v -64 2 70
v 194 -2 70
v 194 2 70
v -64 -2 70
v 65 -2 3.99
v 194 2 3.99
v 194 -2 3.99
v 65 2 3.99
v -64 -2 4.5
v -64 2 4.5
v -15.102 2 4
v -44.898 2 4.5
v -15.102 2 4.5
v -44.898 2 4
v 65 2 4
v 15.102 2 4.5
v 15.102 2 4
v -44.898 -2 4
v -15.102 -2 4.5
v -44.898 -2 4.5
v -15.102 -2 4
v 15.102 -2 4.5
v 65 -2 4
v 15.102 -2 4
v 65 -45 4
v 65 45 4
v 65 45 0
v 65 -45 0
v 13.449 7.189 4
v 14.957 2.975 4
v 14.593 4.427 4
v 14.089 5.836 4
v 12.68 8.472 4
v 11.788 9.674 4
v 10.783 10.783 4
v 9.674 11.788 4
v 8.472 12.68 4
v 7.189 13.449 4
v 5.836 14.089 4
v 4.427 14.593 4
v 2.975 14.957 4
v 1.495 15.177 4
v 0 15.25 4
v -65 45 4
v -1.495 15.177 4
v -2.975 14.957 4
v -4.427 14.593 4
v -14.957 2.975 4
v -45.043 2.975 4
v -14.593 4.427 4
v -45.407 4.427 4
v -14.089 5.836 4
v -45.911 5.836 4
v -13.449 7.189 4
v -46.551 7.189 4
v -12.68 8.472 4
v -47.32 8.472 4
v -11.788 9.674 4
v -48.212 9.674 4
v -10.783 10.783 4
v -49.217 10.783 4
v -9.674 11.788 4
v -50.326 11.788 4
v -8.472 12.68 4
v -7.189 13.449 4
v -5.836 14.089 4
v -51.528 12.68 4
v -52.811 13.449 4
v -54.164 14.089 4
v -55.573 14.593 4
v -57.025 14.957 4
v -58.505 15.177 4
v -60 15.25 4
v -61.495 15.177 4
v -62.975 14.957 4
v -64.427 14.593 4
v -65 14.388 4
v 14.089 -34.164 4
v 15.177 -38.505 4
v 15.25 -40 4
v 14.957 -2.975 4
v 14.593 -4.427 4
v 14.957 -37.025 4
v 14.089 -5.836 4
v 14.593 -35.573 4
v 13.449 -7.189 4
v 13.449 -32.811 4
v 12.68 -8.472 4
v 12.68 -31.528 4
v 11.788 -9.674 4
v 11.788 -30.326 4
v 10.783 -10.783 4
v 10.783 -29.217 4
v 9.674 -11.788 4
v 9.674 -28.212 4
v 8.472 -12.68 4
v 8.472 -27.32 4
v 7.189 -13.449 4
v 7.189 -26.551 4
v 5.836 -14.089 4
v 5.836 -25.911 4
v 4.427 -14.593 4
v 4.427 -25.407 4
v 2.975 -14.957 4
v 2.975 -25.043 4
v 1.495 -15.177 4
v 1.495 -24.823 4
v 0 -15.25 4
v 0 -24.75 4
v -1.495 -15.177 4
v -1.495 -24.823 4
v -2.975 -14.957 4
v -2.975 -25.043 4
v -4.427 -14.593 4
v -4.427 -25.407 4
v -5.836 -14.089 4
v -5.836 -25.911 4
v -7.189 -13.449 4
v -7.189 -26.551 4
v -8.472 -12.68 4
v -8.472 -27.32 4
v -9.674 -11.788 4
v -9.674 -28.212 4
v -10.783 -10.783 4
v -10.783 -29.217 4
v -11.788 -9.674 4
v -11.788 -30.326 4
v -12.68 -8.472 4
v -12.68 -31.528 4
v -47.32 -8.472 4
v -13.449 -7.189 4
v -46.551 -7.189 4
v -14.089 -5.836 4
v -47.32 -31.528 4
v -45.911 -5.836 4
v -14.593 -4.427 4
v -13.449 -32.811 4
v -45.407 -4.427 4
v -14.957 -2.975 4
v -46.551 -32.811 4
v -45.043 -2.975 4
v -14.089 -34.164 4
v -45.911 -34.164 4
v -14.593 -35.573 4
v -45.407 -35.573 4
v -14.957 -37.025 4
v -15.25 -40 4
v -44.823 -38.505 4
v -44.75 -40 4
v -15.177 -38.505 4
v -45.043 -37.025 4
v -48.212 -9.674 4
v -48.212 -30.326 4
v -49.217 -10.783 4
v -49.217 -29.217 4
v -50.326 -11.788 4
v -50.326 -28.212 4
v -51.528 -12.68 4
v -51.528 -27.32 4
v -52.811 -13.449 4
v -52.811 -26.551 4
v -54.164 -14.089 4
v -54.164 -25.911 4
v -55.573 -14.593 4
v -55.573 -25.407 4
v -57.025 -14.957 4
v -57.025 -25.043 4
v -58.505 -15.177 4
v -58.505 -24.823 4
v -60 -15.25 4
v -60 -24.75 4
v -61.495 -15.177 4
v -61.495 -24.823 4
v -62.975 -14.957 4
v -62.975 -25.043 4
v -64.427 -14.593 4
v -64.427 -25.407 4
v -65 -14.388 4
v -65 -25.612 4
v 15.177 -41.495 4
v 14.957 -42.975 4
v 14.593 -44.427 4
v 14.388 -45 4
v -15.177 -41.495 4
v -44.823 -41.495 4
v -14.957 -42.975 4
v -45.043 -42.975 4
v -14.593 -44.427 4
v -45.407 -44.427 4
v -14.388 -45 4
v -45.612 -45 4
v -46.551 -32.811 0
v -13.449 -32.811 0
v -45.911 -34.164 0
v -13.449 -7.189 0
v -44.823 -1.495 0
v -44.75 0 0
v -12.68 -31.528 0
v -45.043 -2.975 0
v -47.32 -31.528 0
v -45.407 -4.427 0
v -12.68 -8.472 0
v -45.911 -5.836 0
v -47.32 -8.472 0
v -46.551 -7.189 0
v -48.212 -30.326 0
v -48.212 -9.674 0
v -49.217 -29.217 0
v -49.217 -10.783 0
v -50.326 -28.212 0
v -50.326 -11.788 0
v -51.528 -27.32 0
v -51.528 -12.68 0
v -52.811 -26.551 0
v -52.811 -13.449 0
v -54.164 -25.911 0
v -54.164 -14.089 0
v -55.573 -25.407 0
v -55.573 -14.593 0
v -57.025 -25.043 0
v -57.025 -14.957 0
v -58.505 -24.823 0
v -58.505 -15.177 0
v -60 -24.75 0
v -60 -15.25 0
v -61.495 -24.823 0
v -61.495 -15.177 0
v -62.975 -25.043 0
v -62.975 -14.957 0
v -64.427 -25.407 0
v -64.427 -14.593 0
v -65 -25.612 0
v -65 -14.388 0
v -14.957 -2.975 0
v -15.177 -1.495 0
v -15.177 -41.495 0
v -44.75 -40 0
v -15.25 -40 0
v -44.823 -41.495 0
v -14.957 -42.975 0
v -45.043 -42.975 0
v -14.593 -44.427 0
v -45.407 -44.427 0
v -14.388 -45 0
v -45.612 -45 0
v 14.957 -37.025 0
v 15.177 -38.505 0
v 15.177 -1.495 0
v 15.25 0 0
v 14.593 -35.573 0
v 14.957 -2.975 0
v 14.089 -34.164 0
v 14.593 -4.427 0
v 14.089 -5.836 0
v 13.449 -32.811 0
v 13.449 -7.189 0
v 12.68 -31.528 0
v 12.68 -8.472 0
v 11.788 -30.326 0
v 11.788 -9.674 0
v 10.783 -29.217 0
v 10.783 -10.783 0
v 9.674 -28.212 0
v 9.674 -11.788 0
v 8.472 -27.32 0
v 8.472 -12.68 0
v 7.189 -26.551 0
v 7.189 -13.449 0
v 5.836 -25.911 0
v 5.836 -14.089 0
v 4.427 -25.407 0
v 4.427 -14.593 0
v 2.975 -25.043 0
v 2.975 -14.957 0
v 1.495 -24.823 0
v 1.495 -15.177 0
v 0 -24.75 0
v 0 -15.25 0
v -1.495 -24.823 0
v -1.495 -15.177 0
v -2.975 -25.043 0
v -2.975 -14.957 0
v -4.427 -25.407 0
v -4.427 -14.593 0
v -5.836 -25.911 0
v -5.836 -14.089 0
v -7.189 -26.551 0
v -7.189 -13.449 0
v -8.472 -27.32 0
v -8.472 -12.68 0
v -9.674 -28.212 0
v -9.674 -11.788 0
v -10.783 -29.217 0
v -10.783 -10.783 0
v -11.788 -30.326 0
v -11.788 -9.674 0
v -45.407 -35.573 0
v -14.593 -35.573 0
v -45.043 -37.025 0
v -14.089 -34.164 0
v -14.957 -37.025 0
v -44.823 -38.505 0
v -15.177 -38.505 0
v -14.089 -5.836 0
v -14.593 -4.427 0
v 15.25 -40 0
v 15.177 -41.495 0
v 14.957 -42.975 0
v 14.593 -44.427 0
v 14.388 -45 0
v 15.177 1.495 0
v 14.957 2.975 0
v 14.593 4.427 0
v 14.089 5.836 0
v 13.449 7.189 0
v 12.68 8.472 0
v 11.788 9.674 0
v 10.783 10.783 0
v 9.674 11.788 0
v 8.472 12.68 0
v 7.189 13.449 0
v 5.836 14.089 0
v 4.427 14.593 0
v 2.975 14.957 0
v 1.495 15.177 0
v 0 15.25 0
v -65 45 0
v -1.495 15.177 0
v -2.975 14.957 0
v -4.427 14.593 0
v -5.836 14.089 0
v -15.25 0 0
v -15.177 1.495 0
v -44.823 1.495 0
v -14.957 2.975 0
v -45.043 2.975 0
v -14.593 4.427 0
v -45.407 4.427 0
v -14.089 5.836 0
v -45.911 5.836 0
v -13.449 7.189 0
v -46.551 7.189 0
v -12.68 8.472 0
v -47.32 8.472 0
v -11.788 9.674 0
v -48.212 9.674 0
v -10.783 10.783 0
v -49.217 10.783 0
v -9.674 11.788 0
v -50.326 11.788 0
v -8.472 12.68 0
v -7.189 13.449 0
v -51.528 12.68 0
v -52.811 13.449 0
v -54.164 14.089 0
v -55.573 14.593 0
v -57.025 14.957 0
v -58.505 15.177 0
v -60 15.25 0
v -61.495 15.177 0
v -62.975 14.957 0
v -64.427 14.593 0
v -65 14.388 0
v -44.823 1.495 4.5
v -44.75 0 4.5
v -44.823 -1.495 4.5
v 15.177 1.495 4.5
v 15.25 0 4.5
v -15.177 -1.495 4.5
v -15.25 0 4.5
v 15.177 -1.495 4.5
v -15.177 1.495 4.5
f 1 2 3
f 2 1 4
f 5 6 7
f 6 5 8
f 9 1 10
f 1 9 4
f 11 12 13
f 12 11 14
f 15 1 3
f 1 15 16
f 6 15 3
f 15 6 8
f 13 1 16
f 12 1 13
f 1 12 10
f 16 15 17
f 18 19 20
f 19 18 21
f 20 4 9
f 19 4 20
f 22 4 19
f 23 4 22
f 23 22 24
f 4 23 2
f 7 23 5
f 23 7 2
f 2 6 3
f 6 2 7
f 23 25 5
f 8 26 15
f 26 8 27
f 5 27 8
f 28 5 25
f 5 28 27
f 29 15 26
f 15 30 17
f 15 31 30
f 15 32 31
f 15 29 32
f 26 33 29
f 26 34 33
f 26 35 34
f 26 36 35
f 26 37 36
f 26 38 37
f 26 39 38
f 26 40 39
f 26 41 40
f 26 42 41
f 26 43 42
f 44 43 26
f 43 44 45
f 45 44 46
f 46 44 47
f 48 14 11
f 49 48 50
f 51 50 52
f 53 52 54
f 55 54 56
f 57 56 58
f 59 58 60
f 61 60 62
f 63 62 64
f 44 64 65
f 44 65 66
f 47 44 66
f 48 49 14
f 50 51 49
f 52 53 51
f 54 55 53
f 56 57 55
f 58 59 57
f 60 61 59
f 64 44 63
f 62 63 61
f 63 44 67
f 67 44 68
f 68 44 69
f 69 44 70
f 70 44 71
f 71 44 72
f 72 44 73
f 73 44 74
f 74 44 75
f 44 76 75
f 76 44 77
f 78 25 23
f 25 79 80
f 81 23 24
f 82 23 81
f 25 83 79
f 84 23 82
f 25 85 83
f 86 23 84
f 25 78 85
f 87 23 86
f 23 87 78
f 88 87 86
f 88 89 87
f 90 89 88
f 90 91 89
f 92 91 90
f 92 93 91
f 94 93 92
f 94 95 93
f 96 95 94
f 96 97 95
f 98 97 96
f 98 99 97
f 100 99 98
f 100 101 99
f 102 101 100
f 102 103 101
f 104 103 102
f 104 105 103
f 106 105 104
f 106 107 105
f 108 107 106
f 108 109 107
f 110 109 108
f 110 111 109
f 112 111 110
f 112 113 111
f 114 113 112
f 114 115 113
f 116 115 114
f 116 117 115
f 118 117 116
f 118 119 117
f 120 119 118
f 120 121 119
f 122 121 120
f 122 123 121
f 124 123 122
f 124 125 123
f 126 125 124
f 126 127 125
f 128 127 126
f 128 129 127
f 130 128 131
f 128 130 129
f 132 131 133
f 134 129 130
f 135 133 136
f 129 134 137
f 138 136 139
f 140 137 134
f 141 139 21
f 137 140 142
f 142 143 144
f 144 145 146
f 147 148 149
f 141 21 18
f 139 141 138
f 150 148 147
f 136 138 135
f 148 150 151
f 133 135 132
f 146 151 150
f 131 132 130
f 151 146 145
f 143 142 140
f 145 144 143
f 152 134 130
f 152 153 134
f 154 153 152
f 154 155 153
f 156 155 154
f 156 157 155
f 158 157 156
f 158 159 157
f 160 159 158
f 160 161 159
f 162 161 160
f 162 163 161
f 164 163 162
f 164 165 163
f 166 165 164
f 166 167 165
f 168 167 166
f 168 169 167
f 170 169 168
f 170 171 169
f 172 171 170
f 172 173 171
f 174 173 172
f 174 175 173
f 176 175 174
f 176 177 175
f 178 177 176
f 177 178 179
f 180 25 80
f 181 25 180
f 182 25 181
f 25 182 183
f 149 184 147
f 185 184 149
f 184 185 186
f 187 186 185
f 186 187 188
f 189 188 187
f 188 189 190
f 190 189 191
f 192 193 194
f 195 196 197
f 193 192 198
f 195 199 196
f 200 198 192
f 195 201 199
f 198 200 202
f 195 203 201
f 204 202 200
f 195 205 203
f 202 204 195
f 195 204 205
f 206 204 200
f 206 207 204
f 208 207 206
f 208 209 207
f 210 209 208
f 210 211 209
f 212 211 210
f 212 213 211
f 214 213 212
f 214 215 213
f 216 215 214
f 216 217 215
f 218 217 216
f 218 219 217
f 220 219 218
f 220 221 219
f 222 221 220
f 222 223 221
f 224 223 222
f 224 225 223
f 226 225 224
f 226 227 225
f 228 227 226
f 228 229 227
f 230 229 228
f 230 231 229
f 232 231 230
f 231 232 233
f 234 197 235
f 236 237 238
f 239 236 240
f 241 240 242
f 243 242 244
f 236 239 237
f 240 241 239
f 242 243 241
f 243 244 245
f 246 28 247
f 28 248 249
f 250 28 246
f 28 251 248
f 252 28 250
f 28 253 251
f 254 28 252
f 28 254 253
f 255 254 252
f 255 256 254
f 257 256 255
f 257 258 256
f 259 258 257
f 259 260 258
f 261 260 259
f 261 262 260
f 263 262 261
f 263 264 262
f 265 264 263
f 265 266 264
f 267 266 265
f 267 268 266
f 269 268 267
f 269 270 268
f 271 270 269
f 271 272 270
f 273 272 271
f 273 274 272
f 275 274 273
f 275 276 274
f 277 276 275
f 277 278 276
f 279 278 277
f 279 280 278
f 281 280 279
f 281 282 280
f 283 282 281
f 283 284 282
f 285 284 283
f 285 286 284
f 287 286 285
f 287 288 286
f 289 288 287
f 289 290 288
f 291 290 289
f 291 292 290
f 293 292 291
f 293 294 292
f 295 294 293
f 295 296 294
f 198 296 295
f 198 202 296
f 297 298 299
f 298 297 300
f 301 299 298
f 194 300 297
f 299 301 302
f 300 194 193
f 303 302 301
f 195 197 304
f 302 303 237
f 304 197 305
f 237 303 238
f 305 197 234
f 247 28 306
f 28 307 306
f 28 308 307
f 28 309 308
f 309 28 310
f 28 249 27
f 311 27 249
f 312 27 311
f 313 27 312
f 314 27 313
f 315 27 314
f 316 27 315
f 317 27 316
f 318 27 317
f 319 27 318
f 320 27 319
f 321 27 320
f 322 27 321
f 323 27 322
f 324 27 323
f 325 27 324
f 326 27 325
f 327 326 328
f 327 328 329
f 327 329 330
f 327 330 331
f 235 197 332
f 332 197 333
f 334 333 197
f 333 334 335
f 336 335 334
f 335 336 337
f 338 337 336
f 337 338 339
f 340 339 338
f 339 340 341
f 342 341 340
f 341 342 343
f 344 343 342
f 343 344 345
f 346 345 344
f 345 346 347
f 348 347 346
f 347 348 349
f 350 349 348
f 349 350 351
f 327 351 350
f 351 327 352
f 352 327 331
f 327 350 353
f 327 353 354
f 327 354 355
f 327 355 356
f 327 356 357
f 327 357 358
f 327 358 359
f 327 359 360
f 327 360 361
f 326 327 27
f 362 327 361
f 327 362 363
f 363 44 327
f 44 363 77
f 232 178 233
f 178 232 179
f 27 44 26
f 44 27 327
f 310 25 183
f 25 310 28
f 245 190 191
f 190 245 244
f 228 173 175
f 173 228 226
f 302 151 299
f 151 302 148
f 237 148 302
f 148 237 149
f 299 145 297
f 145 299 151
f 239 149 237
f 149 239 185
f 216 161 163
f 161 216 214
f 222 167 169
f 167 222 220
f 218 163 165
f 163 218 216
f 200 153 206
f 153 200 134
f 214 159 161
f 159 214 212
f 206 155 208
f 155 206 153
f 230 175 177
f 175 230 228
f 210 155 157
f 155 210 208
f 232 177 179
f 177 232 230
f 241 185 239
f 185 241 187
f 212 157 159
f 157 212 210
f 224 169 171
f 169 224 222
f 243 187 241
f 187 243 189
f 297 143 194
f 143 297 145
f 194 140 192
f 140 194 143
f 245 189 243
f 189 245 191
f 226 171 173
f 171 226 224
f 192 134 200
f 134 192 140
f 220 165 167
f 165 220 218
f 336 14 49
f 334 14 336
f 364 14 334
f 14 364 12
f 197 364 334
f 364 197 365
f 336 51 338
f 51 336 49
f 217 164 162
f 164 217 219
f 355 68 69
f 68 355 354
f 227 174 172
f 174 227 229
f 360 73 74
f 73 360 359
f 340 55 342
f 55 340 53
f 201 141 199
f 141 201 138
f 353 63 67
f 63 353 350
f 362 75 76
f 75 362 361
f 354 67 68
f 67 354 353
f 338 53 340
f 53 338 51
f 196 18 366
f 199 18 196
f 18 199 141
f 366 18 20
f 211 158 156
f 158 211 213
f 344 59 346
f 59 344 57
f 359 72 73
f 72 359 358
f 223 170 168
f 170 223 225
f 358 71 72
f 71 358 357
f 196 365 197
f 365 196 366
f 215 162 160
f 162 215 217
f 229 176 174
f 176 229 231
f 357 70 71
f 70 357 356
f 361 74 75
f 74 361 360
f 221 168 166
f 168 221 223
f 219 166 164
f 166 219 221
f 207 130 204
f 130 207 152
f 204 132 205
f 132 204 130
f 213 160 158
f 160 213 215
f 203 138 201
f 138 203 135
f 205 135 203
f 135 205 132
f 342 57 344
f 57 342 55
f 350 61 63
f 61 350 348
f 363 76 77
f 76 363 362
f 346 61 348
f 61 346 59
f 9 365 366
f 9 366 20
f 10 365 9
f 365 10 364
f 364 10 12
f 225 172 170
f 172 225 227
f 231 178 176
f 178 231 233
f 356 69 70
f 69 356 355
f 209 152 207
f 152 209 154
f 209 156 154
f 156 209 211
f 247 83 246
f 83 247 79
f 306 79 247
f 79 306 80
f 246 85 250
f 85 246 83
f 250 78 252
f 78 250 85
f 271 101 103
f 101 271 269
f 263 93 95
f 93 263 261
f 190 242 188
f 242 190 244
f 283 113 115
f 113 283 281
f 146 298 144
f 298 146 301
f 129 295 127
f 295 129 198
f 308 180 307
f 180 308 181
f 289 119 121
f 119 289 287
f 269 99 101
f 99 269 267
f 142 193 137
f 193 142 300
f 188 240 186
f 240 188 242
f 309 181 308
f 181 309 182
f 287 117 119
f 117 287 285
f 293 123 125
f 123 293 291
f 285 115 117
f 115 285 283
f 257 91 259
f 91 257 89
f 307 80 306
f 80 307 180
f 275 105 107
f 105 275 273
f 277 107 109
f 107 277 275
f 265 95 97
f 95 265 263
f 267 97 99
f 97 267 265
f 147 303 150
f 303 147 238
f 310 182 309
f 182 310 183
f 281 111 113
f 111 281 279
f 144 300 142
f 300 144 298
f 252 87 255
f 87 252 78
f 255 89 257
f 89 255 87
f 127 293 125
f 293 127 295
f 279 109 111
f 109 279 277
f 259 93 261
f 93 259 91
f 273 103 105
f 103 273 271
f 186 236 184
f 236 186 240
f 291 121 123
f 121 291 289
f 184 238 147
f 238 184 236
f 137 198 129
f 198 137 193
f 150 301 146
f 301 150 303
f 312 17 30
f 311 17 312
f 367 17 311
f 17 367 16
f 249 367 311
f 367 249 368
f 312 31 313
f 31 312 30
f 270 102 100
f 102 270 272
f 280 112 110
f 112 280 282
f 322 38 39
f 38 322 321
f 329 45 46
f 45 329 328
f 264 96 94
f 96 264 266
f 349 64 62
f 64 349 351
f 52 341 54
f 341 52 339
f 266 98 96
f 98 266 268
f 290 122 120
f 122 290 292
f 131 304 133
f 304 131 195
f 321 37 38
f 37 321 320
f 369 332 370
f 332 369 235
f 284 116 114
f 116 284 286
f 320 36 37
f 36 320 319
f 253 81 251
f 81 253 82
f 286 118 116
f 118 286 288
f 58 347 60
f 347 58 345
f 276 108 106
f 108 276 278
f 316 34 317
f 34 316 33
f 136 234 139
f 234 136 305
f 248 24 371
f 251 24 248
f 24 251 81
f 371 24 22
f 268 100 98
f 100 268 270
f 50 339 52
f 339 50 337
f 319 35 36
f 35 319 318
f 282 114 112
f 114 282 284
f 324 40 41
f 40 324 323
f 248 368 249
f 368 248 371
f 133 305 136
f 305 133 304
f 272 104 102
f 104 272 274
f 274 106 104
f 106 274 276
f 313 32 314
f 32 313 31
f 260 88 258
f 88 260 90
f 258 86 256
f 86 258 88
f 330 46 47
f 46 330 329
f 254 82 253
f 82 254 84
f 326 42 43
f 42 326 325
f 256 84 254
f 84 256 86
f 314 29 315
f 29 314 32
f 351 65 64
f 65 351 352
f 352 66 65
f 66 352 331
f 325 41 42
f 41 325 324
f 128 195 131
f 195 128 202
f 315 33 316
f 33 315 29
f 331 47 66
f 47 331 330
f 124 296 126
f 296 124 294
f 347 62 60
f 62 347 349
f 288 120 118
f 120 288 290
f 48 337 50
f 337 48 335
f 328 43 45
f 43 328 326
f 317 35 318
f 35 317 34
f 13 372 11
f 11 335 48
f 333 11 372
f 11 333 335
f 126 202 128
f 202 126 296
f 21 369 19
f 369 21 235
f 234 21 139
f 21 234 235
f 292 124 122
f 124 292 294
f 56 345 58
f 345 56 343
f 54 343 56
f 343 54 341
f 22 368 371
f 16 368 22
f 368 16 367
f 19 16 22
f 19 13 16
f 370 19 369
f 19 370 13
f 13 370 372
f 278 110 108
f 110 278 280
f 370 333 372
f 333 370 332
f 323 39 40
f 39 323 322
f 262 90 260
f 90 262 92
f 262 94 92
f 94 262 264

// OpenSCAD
// Rack for six 50 mL conical (Falcon-type) tubes
// Print orientation: flat plate down, walls up. Flip after printing.

$fn = 64;

// ---- Plate ----
plate_x = 130;      // plate length (X)
plate_y = 90;       // plate width (Y)
plate_t = 4;        // plate thickness (Z)

// ---- Holes ----
hole_d     = 30.5;  // hole diameter
hole_nx    = 3;     // holes along X
hole_ny    = 2;     // holes along Y
hole_pitch = 40;    // centre-to-centre spacing (both directions)
cut_extra  = 0.5;   // overshoot past faces for clean cuts

// ---- Walls ----
wall_len   = plate_x; // wall length along X
wall_t     = 4;     // wall thickness along Y
wall_h     = 66;    // wall height from plate bottom (z = 4 to 70)

// ---- Model ----
difference() {
    union() {
        // Base plate
        translate([-plate_x/2, -plate_y/2, 0])
            cube([plate_x, plate_y, plate_t]);

        // Edge walls
        for (sx = [-1, 1])
            translate([sx * (plate_x/2 - 1), -wall_t/2, plate_t - 0.01])
                cube([wall_len + 2 - sx * 2, wall_t, wall_h + 0.01]);
    }

    // Holes
    for (i = [-hole_nx/2 : hole_nx/2 : hole_nx/2 - 1])
        for (j = [-hole_ny/2 : hole_ny/2 : hole_ny/2 - 1])
            translate([i * hole_pitch, j * hole_pitch, -cut_extra])
                cylinder(d = hole_d, h = plate_t + 2 * cut_extra);
}
